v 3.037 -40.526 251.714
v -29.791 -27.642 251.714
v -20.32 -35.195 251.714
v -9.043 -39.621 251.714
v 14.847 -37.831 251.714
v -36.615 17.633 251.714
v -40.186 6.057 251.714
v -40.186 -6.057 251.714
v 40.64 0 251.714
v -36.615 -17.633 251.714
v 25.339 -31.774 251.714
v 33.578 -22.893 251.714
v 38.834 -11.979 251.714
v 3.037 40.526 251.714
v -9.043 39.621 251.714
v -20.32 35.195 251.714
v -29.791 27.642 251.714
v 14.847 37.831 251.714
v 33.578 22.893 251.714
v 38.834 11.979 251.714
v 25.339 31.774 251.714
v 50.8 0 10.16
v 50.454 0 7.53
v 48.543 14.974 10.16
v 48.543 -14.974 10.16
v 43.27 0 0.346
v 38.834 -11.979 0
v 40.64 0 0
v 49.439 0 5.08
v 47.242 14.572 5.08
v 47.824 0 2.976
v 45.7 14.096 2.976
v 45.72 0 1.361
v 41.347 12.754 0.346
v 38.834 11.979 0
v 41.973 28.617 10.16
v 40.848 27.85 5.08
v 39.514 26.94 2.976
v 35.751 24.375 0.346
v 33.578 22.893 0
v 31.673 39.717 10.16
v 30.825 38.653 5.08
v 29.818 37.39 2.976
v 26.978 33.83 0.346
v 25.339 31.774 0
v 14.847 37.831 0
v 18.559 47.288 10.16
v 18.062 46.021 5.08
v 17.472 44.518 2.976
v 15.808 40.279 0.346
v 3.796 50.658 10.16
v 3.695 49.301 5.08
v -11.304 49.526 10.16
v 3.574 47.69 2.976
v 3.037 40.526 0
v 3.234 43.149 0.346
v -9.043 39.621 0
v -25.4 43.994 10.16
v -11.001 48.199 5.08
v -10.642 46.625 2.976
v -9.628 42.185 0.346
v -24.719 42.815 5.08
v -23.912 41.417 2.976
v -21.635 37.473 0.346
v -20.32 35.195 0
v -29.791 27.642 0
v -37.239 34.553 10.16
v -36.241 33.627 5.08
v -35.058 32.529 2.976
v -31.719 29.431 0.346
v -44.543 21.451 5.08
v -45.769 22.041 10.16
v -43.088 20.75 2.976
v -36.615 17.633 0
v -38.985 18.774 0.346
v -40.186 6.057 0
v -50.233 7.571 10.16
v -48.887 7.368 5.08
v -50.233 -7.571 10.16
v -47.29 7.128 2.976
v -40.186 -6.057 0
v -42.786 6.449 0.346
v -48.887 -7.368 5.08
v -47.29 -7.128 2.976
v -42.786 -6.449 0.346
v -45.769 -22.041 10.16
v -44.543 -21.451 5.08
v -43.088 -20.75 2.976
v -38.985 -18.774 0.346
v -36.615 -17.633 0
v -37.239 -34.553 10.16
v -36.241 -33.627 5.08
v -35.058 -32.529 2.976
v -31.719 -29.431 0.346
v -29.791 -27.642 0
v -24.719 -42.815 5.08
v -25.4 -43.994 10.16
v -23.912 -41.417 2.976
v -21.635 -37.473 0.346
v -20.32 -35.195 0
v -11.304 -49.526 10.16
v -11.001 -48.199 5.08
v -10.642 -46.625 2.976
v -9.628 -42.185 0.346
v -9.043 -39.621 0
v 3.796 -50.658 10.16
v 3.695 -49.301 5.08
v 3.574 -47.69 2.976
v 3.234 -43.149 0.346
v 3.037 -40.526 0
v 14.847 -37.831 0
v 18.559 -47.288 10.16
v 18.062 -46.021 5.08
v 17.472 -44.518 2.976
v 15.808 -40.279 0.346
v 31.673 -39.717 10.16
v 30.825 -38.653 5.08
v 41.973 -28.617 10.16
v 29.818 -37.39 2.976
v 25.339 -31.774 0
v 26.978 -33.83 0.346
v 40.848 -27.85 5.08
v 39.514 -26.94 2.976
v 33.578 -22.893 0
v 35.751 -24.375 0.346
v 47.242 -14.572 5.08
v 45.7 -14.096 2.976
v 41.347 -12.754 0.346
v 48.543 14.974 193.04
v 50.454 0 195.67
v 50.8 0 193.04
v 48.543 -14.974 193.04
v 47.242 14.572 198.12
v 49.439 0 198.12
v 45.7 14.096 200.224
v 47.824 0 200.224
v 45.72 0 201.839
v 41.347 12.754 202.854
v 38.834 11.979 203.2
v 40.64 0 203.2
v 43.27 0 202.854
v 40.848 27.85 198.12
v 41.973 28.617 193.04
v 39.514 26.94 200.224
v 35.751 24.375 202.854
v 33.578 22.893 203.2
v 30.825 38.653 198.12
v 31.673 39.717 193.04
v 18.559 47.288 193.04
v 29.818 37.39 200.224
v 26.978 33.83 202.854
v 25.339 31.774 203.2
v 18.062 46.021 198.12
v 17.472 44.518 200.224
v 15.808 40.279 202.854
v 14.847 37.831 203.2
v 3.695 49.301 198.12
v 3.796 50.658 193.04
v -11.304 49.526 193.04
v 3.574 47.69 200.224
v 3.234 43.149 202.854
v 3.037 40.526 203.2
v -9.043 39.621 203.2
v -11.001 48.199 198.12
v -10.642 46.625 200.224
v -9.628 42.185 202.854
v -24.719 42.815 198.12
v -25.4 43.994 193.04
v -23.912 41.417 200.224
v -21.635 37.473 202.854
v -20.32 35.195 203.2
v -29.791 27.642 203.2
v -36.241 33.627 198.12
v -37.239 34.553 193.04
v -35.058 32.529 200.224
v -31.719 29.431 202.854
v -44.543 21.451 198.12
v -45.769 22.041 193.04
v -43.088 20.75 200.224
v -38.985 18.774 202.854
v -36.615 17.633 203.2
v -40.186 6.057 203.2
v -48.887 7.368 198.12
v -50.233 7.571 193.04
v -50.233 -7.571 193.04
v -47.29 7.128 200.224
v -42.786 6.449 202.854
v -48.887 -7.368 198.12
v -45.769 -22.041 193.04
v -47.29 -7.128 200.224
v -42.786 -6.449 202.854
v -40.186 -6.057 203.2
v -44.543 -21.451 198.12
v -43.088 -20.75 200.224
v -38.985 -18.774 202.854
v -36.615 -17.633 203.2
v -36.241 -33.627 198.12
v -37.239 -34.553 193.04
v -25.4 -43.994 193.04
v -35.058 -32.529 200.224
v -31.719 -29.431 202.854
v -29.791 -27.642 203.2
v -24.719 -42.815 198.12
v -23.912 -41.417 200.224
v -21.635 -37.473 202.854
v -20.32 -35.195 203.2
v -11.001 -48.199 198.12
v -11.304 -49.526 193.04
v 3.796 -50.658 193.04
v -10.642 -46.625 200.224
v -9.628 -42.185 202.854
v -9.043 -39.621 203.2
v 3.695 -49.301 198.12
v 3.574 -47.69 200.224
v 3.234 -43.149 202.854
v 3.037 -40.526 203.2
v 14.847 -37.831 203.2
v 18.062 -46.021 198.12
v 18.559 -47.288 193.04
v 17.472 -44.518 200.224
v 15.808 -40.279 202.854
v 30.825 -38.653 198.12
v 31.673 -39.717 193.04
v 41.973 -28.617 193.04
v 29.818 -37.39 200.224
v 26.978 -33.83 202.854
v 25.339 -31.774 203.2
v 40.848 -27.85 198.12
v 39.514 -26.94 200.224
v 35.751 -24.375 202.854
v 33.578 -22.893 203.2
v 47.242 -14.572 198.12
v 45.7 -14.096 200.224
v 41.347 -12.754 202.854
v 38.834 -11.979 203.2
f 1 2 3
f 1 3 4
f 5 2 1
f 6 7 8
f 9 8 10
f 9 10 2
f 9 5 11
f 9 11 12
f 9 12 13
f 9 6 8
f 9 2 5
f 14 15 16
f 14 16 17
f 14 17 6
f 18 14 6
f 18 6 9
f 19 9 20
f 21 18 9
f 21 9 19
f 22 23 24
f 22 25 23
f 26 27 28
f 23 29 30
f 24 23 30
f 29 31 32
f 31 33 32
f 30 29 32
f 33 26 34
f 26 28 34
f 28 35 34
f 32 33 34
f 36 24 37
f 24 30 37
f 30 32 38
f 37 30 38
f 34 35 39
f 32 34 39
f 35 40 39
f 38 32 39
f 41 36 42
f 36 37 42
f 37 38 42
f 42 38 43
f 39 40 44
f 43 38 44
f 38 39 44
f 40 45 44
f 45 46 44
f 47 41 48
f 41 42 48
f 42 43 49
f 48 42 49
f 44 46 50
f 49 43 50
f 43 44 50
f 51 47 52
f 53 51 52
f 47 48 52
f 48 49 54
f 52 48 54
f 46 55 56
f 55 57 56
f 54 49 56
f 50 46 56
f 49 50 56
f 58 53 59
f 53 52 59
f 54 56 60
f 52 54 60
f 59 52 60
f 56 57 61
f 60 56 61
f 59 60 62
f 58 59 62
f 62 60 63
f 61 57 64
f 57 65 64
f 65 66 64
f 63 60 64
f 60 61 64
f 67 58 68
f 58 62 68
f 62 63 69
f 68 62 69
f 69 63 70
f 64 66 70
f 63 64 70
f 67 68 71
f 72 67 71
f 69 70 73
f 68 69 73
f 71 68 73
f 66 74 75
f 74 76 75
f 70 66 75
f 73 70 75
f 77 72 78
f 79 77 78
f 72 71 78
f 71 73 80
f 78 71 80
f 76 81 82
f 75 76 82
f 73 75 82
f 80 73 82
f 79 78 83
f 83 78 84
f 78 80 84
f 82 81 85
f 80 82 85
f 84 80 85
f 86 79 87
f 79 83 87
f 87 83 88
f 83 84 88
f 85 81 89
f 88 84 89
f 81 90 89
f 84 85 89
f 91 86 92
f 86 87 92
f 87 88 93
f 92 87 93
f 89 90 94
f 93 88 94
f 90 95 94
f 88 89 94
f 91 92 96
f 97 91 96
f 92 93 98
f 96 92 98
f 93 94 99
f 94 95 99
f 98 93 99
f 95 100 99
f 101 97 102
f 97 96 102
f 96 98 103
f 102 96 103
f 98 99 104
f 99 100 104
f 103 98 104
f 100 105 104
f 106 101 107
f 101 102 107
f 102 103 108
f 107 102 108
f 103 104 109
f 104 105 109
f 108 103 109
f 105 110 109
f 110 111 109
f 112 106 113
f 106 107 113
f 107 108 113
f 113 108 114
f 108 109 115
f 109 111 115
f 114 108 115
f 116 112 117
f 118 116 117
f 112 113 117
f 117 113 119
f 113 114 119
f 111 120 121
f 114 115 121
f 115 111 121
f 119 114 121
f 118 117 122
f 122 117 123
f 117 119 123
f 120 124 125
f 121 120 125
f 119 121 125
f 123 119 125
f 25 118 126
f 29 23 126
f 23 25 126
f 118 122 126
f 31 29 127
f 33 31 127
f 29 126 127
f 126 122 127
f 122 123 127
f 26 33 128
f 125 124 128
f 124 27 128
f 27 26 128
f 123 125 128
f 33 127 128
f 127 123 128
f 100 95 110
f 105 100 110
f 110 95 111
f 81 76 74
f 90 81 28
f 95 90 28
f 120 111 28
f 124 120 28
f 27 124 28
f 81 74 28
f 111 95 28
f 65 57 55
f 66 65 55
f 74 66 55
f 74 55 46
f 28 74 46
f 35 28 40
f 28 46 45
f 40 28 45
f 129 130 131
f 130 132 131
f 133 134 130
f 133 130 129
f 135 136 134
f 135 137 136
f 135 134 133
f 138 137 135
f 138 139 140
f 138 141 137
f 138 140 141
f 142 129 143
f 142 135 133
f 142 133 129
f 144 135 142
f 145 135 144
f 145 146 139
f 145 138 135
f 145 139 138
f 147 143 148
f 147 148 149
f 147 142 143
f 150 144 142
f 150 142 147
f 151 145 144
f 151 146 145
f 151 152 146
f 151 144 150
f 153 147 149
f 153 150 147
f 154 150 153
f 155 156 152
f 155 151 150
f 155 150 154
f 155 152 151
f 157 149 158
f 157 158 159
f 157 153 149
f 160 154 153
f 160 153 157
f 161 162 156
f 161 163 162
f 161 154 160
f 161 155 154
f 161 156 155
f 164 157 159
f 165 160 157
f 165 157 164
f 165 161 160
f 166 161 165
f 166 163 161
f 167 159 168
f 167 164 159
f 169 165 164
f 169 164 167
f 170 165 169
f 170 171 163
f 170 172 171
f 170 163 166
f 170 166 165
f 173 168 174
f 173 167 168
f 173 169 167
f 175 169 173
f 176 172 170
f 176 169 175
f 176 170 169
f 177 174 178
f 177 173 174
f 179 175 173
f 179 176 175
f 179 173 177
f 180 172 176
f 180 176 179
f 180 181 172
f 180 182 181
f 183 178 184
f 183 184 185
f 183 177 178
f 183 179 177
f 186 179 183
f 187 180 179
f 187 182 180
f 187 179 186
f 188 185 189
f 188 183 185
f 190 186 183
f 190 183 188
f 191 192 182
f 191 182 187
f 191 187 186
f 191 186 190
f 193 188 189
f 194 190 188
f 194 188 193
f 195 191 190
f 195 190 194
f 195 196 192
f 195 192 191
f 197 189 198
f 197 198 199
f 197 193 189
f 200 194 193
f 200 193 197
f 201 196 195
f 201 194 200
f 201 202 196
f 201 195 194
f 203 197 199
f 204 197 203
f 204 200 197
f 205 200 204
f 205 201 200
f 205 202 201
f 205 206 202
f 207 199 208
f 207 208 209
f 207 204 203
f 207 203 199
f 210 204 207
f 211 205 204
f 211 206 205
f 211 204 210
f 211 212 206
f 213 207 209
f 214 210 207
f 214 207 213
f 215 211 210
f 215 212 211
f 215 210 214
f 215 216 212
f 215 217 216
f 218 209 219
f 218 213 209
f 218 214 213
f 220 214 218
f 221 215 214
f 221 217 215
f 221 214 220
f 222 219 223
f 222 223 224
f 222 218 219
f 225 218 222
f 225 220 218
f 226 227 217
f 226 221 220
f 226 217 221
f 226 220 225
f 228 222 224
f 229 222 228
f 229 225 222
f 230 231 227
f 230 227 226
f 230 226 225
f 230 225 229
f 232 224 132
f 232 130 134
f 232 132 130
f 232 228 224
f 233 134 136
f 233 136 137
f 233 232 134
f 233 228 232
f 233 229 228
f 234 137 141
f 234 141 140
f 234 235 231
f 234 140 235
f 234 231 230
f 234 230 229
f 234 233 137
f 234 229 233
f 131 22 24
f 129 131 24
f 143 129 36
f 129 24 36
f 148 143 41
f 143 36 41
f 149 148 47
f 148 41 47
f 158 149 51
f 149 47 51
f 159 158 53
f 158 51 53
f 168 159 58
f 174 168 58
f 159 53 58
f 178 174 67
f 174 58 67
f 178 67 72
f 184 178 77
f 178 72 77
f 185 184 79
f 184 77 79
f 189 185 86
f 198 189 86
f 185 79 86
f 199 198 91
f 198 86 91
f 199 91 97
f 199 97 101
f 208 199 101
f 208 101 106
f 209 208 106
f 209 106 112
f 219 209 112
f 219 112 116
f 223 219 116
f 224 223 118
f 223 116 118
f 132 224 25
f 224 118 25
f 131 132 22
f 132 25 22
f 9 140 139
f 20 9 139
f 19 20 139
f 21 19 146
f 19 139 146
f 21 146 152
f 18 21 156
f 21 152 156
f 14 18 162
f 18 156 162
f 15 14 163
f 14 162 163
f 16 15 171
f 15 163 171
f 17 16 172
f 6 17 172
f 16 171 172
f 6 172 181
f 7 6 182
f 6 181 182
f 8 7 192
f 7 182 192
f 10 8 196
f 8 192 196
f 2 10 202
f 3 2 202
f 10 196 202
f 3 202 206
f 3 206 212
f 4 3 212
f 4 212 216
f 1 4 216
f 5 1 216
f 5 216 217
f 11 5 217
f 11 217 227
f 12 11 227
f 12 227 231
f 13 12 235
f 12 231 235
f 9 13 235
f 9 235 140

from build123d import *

# Parameters (mm, degrees)
F0_R      = 50.8
F1_DEPTH  = 203.2
F2_R      = 10.16
F1_FACE_R = 40.64
F3_DEPTH  = 48.514


with BuildPart() as f1:
    # F0 (on Top) → F1 (new body)
    with BuildSketch(Plane.XY):
        Circle(F0_R)
    extrude(amount=F1_DEPTH)

    # F2
    f2_edges = [f1.edges().sort_by_distance(p)[0] for p in [
        (-50.8, 0, 0),
        (50.8, 0, 101.6),
        (-50.8, 0, 203.2),
    ]]
    fillet(f2_edges, radius=F2_R)

    # F1_face (on face) → F3 (join)
    with BuildSketch(Plane.XY.offset(203.2)):
        Circle(F1_FACE_R)
    extrude(amount=F3_DEPTH)


solid = f1.part
